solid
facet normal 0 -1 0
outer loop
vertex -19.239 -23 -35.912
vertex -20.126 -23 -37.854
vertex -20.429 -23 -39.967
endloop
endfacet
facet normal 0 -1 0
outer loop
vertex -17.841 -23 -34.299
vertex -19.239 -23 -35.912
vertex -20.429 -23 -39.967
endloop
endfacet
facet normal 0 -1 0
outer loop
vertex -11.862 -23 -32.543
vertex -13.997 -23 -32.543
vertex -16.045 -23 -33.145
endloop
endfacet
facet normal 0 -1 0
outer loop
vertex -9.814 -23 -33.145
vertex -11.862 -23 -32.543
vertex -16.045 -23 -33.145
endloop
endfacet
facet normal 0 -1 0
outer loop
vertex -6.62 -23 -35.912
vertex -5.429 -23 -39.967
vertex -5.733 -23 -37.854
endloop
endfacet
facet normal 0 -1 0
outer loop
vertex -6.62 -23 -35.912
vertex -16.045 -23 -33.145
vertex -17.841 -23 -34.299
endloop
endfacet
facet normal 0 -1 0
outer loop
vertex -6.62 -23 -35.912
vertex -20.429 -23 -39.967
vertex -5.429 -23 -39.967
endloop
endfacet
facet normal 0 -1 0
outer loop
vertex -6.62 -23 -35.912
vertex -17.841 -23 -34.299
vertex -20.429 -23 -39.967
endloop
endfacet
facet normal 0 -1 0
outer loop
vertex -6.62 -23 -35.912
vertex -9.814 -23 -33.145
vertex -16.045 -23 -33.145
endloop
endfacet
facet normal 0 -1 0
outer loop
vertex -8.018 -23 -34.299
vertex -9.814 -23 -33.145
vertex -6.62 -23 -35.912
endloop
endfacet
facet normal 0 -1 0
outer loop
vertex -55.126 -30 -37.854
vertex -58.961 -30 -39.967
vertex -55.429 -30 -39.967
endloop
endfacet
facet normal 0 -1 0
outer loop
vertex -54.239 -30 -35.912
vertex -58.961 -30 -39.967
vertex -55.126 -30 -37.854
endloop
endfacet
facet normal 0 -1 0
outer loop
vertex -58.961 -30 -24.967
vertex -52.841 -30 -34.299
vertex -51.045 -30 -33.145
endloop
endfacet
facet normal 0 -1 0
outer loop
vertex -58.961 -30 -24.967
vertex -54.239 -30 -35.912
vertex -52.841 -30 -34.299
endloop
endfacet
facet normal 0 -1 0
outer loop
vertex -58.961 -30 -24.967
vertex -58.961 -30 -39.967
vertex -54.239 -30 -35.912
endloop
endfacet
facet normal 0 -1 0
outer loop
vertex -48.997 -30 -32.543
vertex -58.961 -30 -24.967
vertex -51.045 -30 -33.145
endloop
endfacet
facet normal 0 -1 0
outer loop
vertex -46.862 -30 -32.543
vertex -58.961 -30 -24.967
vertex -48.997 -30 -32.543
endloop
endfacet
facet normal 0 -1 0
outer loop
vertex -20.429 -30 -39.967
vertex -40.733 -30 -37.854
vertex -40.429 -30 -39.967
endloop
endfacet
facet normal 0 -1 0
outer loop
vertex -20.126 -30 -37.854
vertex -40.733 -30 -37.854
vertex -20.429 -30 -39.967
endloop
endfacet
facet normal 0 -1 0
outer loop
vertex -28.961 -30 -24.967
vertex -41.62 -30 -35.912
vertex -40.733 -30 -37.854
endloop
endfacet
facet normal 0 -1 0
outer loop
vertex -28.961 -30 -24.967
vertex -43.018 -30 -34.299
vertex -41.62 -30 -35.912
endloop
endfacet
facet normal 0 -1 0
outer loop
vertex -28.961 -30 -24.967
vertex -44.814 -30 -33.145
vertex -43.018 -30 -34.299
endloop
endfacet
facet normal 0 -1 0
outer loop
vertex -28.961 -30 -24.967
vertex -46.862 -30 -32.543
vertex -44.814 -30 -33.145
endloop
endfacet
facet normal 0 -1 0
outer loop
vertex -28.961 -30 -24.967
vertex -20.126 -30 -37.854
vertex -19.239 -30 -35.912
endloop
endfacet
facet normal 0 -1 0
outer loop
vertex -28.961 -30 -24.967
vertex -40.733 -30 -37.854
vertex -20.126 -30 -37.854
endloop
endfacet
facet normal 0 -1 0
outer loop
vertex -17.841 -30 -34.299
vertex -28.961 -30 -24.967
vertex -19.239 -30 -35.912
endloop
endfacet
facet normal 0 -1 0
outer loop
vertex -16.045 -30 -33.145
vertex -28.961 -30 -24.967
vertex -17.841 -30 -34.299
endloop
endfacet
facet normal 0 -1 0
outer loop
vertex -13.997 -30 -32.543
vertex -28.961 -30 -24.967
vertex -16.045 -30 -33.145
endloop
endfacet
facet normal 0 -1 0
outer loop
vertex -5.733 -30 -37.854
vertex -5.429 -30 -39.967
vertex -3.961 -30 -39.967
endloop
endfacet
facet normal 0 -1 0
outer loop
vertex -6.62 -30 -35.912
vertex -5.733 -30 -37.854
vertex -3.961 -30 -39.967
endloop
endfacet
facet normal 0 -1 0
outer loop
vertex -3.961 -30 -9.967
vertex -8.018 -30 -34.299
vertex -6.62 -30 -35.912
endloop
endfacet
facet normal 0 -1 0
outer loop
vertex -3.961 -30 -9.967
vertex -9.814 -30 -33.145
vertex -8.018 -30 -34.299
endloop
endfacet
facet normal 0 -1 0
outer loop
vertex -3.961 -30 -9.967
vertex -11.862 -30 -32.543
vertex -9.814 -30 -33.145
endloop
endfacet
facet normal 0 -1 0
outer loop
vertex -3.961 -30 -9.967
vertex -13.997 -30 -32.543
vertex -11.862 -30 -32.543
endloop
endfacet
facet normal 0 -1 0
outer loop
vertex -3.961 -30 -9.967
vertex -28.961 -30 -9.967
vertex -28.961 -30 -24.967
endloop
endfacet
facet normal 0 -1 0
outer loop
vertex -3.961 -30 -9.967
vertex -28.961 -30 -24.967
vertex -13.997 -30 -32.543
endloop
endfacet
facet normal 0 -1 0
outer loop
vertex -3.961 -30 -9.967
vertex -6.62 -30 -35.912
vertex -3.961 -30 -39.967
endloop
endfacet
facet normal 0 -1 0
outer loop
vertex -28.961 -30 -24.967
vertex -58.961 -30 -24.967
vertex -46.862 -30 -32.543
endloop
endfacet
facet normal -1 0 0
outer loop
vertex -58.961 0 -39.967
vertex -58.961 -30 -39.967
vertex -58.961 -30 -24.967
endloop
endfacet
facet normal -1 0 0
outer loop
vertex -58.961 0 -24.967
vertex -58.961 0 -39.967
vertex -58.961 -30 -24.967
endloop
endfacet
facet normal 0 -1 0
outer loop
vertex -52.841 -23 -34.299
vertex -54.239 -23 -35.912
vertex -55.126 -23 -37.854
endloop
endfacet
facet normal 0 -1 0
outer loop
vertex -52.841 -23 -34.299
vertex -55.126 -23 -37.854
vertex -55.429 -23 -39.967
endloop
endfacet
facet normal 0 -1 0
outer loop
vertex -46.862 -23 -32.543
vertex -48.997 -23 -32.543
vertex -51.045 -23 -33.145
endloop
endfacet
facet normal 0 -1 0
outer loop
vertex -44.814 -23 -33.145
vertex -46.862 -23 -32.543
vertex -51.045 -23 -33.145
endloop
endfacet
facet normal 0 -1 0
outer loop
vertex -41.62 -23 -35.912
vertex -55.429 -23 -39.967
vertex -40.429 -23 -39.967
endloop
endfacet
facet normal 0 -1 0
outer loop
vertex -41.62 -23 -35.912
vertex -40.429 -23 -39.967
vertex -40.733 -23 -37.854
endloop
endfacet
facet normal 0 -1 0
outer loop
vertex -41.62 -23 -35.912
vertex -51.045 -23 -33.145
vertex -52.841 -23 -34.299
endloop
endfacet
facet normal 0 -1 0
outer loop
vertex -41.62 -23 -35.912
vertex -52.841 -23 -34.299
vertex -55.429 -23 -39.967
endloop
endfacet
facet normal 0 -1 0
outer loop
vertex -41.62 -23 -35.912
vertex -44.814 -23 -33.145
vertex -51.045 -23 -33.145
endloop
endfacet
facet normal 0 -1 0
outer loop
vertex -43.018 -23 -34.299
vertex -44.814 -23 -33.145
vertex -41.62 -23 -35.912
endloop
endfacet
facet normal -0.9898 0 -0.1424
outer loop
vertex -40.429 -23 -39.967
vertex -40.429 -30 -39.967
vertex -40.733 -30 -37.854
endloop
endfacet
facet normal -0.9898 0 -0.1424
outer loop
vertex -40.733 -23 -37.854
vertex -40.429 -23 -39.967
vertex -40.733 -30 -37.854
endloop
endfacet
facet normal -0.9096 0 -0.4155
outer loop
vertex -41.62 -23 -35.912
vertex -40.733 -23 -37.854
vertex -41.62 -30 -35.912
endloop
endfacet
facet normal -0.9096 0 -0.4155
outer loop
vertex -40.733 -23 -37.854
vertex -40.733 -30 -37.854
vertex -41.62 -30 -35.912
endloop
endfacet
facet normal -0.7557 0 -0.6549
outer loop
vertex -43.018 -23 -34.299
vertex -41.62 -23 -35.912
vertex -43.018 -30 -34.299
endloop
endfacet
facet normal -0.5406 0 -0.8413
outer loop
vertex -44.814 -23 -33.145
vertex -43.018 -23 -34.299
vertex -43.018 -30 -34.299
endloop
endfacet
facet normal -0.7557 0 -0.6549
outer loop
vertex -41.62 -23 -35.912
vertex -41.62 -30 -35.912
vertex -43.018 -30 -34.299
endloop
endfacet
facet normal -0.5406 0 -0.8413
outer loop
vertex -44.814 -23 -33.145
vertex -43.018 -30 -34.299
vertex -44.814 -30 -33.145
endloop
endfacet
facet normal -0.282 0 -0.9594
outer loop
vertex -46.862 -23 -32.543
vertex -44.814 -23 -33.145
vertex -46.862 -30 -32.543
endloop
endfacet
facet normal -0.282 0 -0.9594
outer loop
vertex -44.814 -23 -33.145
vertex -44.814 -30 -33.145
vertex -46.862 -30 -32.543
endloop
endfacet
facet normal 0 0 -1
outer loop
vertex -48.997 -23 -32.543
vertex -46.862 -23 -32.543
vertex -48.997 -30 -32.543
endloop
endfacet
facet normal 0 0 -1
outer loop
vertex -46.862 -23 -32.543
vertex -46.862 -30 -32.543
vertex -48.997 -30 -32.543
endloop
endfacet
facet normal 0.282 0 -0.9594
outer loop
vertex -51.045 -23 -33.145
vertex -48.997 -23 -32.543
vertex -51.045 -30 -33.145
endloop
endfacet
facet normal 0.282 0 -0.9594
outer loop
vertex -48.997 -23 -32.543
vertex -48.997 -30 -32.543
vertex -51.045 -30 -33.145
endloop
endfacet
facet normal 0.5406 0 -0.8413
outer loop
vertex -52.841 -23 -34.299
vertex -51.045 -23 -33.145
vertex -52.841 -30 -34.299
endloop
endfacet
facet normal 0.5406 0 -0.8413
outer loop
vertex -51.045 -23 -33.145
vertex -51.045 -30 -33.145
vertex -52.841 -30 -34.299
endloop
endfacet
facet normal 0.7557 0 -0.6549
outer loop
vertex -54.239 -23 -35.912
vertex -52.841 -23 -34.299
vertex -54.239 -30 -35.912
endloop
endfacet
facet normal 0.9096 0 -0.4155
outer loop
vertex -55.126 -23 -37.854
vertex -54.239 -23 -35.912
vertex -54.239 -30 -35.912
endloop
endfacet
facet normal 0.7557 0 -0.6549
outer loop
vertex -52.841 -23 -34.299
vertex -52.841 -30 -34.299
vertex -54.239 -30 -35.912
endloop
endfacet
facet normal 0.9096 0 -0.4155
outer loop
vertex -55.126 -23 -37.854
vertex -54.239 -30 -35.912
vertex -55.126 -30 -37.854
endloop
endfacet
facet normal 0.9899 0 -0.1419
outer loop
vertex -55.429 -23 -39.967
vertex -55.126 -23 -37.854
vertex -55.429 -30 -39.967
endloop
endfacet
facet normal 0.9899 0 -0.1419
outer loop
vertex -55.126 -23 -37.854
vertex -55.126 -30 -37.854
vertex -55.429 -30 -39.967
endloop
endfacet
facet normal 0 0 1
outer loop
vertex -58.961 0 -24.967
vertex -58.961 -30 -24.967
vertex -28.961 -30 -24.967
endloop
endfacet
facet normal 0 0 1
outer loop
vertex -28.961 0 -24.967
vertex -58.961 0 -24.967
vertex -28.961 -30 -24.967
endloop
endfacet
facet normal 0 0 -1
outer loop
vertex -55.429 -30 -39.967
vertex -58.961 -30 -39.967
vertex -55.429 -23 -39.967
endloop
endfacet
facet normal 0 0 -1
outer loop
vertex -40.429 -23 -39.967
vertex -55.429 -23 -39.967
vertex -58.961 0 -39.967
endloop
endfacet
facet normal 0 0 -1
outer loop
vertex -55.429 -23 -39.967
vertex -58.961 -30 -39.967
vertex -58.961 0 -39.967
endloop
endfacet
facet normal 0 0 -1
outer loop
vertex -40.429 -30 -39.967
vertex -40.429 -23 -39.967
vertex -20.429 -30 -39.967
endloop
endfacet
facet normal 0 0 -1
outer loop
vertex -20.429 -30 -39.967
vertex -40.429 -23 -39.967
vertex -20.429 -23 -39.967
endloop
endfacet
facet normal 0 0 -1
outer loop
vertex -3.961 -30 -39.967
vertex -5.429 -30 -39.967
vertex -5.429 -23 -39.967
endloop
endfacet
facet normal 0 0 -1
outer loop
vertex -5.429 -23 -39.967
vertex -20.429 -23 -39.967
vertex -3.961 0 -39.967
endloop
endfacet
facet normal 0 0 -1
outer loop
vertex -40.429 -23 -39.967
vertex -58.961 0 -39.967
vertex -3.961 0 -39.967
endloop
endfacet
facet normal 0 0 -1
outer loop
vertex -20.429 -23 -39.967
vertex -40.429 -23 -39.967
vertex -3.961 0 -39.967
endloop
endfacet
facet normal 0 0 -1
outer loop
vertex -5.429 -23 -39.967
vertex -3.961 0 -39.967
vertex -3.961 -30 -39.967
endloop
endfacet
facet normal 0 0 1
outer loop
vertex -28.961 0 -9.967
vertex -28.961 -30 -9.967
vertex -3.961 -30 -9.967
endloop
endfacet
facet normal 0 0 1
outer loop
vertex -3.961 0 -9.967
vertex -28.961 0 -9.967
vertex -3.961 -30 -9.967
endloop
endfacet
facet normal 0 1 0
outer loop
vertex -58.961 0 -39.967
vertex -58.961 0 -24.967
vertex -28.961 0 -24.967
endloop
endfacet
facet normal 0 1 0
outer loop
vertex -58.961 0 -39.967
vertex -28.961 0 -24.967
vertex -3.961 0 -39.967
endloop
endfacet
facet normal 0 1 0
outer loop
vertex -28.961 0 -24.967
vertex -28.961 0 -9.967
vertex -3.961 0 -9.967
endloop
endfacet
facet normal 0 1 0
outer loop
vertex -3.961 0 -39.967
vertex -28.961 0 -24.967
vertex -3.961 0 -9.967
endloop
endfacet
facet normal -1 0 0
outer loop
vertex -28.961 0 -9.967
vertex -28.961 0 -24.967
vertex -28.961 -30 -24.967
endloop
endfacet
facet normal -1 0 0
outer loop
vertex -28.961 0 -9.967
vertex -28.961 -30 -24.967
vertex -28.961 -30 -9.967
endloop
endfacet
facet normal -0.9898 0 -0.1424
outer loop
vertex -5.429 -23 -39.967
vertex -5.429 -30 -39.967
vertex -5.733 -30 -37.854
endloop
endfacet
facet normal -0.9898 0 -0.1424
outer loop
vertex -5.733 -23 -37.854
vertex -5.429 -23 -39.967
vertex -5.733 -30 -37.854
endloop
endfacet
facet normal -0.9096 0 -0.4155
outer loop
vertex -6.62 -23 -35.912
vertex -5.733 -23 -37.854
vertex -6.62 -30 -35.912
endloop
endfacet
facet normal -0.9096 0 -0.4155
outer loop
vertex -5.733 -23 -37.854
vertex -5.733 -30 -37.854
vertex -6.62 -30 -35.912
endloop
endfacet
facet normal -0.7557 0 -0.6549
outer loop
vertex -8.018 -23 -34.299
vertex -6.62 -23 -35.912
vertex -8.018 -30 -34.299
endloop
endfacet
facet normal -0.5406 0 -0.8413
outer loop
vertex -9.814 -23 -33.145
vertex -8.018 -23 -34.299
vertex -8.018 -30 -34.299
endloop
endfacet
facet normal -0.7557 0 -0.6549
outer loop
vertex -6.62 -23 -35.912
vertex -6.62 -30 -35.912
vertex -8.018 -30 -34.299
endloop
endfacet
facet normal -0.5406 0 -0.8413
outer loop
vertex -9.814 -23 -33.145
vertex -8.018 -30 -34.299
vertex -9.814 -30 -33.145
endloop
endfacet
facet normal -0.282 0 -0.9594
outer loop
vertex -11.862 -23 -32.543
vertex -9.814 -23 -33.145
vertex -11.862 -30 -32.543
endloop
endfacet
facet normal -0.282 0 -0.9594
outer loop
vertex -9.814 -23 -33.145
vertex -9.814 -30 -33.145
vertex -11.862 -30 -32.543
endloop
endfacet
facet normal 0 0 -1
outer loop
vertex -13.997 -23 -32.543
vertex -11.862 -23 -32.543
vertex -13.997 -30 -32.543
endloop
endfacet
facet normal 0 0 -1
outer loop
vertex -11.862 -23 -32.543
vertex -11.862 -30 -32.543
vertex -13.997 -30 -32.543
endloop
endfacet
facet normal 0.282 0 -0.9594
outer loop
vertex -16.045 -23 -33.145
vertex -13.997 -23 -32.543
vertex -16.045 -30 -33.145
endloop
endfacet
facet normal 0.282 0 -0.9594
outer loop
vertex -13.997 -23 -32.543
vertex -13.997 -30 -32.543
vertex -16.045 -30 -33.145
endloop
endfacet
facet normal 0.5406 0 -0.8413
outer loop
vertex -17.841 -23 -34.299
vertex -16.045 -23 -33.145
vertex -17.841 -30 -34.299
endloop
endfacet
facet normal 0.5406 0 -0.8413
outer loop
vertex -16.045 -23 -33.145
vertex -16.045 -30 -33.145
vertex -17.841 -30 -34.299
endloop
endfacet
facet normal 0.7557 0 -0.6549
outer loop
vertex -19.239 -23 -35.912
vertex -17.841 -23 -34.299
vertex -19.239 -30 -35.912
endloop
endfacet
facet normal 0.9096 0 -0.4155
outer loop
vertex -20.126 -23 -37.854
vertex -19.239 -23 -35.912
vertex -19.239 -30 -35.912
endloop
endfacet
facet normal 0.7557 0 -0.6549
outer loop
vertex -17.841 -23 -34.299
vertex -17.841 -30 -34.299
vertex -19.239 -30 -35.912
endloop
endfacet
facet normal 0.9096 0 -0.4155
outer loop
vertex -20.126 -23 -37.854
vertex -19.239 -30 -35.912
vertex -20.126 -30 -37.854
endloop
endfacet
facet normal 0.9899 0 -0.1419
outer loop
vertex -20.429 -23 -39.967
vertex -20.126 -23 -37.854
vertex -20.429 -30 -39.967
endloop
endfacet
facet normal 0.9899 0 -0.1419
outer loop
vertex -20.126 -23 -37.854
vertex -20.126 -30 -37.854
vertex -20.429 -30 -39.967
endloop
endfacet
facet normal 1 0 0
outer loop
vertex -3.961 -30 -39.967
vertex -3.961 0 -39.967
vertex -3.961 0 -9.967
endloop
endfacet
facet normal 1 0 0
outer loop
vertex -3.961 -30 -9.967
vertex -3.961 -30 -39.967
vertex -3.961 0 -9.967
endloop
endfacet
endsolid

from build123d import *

# Parameters (mm, degrees)
F0_W     = 55
F0_H     = 30
F1_DEPTH = 30
F2_W     = 30
F2_H     = 15
F3_DEPTH = 30.001
F5_DEPTH = 7


with BuildPart() as f1:
    # F0 (on Front) → F1 (new body)
    with BuildSketch(Plane.XZ):
        with Locations((-31.4610829165, -24.9669793993)):
            Rectangle(F0_W, F0_H)
    extrude(amount=F1_DEPTH)

    # F2 (on face) → F3 (cut, through all)
    with BuildSketch(Plane.XZ.offset(30)):
        with Locations((-43.9610829165, -17.4669793993)):
            Rectangle(F2_W, F2_H)
    extrude(amount=-F3_DEPTH, mode=Mode.SUBTRACT)

    # F4 (on face) → F5 (cut)
    with BuildSketch(Plane.XZ.offset(30)):
        with BuildLine():
            Line((-55.4294285178, -39.9669793993), (-40.4294285178, -39.9669793993))
            ThreePointArc((-40.4294285178, -39.9669793993), (-47.9294285178, -32.4669793993), (-55.4294285178, -39.9669793993))
        make_face()
        with BuildLine():
            ThreePointArc((-5.4294285178, -39.9669793993), (-12.9294285178, -32.4669793993), (-20.4294285178, -39.9669793993))
            Line((-20.4294285178, -39.9669793993), (-5.4294285178, -39.9669793993))
        make_face()
    extrude(amount=-F5_DEPTH, mode=Mode.SUBTRACT)


solid = f1.part
